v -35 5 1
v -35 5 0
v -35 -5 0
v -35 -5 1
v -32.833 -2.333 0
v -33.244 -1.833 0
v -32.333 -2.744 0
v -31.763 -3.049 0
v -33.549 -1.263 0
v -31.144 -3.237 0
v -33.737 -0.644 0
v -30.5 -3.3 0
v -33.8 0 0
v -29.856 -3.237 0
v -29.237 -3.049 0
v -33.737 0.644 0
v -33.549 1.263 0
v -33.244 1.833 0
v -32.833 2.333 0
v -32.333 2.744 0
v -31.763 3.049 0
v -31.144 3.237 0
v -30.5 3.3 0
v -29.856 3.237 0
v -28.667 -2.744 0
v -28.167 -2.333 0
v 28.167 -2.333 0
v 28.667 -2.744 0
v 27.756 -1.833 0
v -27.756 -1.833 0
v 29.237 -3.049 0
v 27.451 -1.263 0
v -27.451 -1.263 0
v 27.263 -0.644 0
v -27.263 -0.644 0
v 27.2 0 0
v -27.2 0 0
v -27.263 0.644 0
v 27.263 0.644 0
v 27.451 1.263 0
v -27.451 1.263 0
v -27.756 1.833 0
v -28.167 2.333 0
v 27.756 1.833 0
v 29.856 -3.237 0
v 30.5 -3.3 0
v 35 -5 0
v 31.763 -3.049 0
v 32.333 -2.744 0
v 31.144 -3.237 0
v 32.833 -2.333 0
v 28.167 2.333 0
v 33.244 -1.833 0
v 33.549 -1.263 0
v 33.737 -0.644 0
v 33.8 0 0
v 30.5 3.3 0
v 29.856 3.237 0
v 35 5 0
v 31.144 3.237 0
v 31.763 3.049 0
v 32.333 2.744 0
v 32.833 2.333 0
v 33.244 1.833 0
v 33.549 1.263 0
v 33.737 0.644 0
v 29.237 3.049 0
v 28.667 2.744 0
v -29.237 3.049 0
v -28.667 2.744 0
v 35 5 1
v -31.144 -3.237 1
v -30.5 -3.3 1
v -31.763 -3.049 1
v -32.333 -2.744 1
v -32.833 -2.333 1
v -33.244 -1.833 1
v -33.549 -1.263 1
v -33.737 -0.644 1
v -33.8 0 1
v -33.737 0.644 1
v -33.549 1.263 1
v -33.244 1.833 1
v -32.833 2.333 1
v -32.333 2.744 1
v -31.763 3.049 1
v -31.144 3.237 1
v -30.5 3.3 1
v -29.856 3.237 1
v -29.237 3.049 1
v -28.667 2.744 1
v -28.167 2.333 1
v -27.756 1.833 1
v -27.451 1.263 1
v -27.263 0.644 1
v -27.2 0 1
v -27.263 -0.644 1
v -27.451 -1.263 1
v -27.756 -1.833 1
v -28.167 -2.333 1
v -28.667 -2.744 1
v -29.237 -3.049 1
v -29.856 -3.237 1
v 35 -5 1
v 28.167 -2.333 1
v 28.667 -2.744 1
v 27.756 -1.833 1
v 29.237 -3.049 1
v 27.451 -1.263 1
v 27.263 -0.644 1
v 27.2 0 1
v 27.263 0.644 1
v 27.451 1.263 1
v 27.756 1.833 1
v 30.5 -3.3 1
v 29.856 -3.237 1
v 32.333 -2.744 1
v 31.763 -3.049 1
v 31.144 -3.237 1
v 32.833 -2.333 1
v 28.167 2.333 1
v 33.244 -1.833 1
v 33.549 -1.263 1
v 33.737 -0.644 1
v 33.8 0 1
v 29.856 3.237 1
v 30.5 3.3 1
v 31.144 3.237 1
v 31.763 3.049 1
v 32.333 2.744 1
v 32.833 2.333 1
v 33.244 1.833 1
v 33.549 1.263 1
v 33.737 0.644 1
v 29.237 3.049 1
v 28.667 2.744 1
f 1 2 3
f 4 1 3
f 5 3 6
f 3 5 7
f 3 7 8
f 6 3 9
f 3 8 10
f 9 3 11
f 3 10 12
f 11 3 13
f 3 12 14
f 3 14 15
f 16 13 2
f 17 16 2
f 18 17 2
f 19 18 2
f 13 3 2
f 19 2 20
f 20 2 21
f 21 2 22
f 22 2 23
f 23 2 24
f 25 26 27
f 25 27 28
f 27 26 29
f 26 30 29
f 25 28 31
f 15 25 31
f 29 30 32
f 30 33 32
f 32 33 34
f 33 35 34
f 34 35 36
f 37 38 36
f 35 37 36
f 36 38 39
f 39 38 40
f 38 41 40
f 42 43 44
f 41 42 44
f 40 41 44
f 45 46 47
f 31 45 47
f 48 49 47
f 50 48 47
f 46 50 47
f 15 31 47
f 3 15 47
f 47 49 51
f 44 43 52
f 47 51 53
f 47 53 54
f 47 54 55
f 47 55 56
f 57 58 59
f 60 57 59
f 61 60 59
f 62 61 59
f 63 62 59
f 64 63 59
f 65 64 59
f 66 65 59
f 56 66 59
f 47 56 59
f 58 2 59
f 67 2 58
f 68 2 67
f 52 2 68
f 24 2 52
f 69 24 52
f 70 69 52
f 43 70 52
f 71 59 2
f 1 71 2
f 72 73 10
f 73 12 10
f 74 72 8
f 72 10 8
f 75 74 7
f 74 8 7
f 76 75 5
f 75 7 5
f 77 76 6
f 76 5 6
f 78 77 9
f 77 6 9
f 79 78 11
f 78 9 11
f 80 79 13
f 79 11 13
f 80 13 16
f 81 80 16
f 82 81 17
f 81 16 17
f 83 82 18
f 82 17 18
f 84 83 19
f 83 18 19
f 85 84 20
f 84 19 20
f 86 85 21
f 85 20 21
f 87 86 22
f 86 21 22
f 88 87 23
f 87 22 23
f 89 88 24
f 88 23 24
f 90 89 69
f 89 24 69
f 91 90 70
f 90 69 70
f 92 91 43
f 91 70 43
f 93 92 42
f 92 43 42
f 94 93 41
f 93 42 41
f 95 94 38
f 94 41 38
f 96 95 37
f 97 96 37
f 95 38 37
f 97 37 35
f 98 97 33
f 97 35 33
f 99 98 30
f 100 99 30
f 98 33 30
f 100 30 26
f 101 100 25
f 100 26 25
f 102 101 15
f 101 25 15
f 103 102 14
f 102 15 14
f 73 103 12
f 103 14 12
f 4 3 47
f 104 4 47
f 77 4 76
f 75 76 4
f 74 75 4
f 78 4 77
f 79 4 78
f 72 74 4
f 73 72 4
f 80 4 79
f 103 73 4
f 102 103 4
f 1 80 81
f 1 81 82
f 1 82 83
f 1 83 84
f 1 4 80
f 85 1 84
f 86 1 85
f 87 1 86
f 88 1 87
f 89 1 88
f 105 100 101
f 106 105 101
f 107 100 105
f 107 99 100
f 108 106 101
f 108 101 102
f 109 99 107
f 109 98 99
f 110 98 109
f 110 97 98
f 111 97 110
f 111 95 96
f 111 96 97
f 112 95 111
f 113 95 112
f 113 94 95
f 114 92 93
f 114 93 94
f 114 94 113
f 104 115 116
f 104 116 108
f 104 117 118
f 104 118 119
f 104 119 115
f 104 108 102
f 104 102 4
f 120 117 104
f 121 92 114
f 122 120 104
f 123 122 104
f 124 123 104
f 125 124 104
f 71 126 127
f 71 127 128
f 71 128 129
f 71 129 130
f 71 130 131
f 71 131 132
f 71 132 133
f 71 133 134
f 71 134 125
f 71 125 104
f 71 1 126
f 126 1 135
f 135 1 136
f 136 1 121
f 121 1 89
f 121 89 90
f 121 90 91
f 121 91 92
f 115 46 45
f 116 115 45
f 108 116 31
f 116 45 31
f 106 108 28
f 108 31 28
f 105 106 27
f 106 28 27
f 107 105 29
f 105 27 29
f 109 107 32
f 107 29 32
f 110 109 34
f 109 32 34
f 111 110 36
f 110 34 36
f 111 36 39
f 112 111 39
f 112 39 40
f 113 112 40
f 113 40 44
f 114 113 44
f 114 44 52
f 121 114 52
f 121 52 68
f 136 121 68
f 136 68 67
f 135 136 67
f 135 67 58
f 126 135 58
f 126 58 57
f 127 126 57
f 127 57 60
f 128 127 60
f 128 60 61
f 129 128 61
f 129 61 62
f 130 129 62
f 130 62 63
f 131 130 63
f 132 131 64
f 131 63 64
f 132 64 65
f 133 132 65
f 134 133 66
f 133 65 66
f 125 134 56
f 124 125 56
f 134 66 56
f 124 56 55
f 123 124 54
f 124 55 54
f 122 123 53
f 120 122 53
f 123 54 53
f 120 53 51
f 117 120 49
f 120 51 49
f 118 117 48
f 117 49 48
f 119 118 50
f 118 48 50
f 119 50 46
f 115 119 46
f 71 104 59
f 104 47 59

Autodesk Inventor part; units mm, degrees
ref_plane "YZ Plane" through (0, 0, 0) normal (1, 0, 0) x (0, 1, 0)
ref_plane "XZ Plane" through (0, 0, 0) normal (0, 1, 0) x (-1, 0, 0)
ref_plane "XY Plane" through (0, 0, 0) normal (0, 0, 1) x (1, 0, 0)
sketch "Sketch1" plane through (0, 0, 0) normal (0, 0, 1) x (1, 0, 0)
  line L0 (-35, -5) -> (35, -5)
  line L1 (35, -5) -> (35, 5)
  line L2 (35, 5) -> (-35, 5)
  line L3 (-35, 5) -> (-35, -5)
  line L4 (-35, -5) -> (35, 5) construction
  line L5 (35, -5) -> (-35, 5) construction
  point P0 (0, 0)
  dimension "d0" = 70
  dimension "d1" = 10
extrude "Extrusion1" add sketch "Sketch1" along normal blind 1
sketch "Sketch2" plane through (0, 0, 1) normal (0, 0, 1) x (1, 0, 0)
  line L0 (-30.5, 0) -> (30.5, 0) construction
  point P0 (0, 0)
  point P1 (0, 0)
  dimension "d4" = 61
hole "Hole1" at (-30.5, 0, 1) at (30.5, 0, 1) direction (0, 0, -1) diameter 6.6 depth 8 tip angle 118 clearance for "Countersunk Flat Head Screw DIN EN ISO 2009" size "M6" standard "DIN"
properties part number "Cap_CU_Oben" material "Copper"
